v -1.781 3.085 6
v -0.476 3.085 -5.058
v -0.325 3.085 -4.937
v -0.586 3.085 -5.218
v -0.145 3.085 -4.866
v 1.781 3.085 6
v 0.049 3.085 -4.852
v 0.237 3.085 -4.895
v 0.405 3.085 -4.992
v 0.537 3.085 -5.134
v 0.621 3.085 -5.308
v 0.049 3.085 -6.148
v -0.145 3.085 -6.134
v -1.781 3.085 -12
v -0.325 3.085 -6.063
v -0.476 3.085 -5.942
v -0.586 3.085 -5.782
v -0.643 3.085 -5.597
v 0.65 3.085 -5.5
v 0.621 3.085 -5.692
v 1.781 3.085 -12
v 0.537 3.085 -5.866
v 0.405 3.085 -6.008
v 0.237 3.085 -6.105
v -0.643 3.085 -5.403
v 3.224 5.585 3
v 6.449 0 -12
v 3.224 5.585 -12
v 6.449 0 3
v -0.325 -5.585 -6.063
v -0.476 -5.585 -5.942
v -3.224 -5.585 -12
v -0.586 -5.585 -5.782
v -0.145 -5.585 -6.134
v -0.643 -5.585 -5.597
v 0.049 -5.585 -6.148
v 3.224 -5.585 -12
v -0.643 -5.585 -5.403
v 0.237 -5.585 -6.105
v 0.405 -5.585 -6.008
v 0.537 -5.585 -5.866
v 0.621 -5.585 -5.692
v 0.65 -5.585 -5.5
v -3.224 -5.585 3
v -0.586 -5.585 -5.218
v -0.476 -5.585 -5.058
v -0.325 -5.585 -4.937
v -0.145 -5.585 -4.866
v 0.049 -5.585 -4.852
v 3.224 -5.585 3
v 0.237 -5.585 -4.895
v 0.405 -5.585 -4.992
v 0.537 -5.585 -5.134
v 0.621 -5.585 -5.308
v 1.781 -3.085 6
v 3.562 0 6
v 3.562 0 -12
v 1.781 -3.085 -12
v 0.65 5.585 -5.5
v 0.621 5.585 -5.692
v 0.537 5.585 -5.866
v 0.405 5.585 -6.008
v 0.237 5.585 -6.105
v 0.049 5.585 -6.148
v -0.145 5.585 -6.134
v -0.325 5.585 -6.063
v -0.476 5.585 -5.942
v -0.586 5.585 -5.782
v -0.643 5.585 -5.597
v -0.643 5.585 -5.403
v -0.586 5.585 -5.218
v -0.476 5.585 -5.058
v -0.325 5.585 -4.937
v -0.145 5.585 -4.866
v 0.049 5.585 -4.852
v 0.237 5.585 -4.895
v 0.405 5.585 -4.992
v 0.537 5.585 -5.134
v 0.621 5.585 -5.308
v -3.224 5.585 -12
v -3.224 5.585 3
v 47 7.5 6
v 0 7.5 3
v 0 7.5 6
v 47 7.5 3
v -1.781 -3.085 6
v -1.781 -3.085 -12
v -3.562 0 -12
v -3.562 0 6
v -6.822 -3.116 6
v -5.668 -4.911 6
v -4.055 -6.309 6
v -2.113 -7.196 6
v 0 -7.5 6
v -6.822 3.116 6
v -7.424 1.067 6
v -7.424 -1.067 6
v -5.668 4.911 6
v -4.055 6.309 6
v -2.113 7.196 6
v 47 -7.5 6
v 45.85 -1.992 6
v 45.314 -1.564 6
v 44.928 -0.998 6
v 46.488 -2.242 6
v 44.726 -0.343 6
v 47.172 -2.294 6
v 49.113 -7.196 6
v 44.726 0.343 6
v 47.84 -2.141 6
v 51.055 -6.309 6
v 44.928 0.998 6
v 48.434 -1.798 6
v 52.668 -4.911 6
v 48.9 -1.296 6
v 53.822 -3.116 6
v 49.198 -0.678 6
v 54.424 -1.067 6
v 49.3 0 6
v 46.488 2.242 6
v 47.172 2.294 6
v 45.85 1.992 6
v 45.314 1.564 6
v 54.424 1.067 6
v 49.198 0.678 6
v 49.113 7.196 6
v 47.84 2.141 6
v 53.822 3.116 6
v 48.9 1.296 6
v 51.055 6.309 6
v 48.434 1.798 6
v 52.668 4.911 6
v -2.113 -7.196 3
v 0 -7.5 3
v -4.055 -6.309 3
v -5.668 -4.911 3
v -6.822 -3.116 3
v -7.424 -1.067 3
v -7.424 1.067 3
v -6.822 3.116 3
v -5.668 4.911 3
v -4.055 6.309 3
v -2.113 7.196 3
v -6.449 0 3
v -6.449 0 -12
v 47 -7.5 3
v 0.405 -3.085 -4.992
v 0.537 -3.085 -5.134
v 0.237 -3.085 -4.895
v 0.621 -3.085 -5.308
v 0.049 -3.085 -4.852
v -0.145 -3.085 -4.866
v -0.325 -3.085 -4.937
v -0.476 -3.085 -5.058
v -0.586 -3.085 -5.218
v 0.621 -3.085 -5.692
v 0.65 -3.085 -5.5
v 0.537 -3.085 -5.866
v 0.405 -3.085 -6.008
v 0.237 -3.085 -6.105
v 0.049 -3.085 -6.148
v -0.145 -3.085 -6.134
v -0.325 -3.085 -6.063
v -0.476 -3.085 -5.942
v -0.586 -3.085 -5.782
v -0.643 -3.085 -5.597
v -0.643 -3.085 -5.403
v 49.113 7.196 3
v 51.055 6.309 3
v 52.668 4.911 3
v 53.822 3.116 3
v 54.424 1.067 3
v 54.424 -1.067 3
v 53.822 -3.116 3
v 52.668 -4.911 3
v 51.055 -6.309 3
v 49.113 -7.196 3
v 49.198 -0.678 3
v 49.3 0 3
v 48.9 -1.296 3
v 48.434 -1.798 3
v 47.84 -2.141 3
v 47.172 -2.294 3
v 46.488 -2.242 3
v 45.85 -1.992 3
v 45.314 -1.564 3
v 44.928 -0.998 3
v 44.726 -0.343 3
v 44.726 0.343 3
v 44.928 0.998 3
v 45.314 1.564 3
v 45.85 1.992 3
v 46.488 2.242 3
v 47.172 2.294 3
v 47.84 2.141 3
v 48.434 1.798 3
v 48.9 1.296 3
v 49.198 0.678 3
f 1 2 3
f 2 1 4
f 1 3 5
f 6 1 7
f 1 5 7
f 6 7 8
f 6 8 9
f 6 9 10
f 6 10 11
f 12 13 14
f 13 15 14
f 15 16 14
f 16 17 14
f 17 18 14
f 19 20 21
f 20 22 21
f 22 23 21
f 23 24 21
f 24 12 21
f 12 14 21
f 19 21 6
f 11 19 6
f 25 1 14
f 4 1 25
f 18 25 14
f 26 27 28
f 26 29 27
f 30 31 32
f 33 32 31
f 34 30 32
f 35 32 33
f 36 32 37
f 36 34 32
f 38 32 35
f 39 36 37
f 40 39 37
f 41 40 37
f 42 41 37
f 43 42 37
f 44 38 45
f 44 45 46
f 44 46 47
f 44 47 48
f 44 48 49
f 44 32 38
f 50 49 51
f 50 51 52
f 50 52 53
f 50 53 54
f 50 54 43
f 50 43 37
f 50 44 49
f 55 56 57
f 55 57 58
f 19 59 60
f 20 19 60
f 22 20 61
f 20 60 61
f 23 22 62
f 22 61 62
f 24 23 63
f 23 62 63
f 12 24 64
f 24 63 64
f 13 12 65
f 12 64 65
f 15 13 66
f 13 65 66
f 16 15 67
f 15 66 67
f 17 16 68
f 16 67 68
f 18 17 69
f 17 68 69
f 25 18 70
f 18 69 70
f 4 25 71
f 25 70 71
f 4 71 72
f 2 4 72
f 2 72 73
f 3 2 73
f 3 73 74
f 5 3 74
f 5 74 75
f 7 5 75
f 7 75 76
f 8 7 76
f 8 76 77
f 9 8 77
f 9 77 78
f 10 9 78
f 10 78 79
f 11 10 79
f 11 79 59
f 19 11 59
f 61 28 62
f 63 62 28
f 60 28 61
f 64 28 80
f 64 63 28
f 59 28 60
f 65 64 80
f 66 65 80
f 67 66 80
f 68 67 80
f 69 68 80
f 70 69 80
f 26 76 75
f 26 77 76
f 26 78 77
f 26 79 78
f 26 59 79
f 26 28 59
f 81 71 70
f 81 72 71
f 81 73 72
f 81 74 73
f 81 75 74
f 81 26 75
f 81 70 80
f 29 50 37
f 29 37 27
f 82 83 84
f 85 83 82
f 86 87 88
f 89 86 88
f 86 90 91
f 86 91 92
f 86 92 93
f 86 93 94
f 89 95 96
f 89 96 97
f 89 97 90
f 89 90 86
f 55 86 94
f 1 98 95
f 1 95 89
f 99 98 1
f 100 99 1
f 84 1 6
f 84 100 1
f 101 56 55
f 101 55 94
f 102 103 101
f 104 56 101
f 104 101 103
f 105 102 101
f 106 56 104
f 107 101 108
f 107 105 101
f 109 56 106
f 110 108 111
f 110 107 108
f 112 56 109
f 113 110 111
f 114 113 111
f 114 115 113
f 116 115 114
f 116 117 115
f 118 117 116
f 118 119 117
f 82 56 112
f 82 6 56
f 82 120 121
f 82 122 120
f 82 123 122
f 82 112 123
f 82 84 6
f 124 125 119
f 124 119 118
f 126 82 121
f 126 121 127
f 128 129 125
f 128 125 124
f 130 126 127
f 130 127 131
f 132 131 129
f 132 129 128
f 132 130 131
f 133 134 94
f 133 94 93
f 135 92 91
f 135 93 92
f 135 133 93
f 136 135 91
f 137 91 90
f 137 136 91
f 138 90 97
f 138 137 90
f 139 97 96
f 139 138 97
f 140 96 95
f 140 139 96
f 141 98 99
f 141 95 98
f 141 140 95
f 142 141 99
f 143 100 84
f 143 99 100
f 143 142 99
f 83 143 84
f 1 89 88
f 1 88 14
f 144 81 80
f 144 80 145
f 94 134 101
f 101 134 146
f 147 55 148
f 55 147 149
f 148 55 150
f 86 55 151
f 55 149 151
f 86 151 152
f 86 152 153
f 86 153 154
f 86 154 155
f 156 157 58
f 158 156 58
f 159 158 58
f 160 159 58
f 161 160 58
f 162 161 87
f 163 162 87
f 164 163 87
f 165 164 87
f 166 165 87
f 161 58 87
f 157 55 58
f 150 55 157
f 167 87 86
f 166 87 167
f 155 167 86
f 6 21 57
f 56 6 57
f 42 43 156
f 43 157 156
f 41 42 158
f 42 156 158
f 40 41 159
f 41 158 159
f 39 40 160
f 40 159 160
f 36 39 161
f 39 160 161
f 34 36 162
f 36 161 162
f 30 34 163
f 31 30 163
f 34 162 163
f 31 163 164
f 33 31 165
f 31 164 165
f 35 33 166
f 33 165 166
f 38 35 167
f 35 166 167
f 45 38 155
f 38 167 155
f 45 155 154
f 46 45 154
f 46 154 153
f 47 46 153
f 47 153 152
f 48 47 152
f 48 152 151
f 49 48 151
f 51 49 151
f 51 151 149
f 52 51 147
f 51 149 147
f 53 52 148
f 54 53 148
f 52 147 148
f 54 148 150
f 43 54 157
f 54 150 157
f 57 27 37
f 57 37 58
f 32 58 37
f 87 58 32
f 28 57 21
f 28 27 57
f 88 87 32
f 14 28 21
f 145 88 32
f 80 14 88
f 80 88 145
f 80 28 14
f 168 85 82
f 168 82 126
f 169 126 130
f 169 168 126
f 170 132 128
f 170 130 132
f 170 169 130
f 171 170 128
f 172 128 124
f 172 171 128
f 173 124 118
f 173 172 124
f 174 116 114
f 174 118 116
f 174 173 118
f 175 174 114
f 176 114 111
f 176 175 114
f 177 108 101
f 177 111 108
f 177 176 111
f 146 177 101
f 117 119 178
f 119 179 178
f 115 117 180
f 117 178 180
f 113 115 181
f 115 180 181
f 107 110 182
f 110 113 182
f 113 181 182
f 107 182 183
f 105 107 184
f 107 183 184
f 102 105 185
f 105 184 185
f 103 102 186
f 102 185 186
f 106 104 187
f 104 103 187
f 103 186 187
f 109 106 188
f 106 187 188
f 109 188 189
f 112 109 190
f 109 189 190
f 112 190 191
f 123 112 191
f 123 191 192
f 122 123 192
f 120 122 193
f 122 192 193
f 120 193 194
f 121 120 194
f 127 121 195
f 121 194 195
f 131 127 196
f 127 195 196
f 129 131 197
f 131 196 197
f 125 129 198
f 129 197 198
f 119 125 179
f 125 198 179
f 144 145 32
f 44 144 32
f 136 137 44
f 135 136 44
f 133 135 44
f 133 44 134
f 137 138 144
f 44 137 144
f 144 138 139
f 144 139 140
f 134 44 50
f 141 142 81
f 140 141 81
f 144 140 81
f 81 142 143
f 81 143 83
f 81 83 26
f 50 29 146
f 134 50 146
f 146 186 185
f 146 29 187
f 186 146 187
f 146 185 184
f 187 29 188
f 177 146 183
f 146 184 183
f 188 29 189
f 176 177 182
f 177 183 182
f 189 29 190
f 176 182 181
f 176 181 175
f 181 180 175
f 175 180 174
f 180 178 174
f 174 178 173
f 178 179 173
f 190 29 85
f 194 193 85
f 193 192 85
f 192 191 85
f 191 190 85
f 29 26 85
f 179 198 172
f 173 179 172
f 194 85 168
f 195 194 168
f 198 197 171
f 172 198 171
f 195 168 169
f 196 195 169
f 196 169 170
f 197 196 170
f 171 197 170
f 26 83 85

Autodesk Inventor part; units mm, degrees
ref_plane "YZ Plane" through (0, 0, 0) normal (1, 0, 0) x (0, 1, 0)
ref_plane "XZ Plane" through (0, 0, 0) normal (0, 1, 0) x (-1, 0, 0)
ref_plane "Work Plane4" through (0, 0, 3) normal (0, 0, 1) x (1, 0, 0)
sketch "Sketch3" plane through (0, 0, 3) normal (0, 0, 1) x (1, 0, 0)
  circle A0 centre (47, 0) radius 2.3
  circle A1 centre (0, 0) radius 7.5 projected
  circle A2 centre (47, 0) radius 7.5
  line L0 (0, -7.5) -> (47, -7.5)
  line L1 (47, 0) -> (12.3969, 0) construction
  line L2 (0, 7.5) -> (47, 7.5)
  point P0 (0, 0)
  dimension "d13" = 15
  dimension "d5" = 4.6
  dimension "d14" = 47
extrude "Extrusion5" add sketch "Sketch3" along normal blind 3
sketch "Sketch6" plane through (0, 0, 3) normal (0, 0, -1) x (-1, 0, 0)
  arc A0 (0, -7.5) -> (0, 7.5) centre (0, 0) ccw projected
  line L0 (0, 0) -> (3.1, 0) construction
  line L1 (0, 0) -> (1.55, 2.6847) construction
  line L2 (0, 0) -> (-1.55, 2.6847) construction
  line L3 (0, 0) -> (-3.1, 0) construction
  line L4 (0, 0) -> (-1.55, -2.6847) construction
  line L5 (0, 0) -> (1.55, -2.6847) construction
  line L6 (-1.55, 2.6847) -> (1.55, 2.6847) construction
  line L7 (1.55, 2.6847) -> (3.1, 0) construction
  line L8 (3.1, 0) -> (1.55, -2.6847) construction
  line L9 (1.55, -2.6847) -> (-1.55, -2.6847) construction
  line L10 (-1.55, -2.6847) -> (-3.1, 0) construction
  line L11 (-3.1, 0) -> (-1.55, 2.6847) construction
  line L12 (3.5619, 0) -> (1.7809, 3.0847)
  line L13 (1.7809, 3.0847) -> (-1.7809, 3.0847)
  line L14 (-1.7809, 3.0847) -> (-3.5619, 0)
  line L15 (-3.5619, 0) -> (-1.7809, -3.0847)
  line L16 (-1.7809, -3.0847) -> (1.7809, -3.0847)
  line L17 (1.7809, -3.0847) -> (3.5619, 0)
  line L18 (3.2243, 5.5847) -> (6.4486, 0)
  line L19 (6.4486, 0) -> (3.2243, -5.5847)
  line L20 (3.2243, -5.5847) -> (-3.2243, -5.5847)
  line L21 (-3.2243, -5.5847) -> (-6.4486, 0)
  line L22 (-6.4486, 0) -> (-3.2243, 5.5847)
  line L23 (-3.2243, 5.5847) -> (3.2243, 5.5847)
  point P0 (0, 0)
  dimension "d17" = 3.1
  dimension "d20" = 360
  dimension "d22" = 0.4
  dimension "d23" = 2.5
extrude "Extrusion6" add sketch "Sketch6" along normal blind 15
sketch "Sketch7" plane through (0, 0, 3) normal (0, 0, -1) x (-1, 0, 0)
  line L0 (3.5619, 0) -> (1.7809, 3.0847) projected
  line L1 (1.7809, 3.0847) -> (-1.7809, 3.0847) projected
  line L2 (-1.7809, 3.0847) -> (-3.5619, 0) projected
  line L3 (-3.5619, 0) -> (-1.7809, -3.0847) projected
  line L4 (-1.7809, -3.0847) -> (1.7809, -3.0847) projected
  line L5 (1.7809, -3.0847) -> (3.5619, 0) projected
  point P0 (0, 0)
extrude "Extrusion7" cut sketch "Sketch7" against normal blind 15
sketch "Sketch8" plane through (-3.2243, 5.5847, 3) normal (0, 1, 0) x (1, 0, 0)
  line L0 (6.4486, 0) -> (0, 0) projected
  line L1 (6.4486, 0) -> (6.4486, 15) projected
  line L2 (0, 15) -> (6.4486, 15) projected
  line L3 (0, 0) -> (0, 15) projected
  line L4 (0, 0) -> (0, 15) projected
  line L5 (1.4434, 15) -> (5.0053, 15) projected
  line L6 (3.2243, 0) -> (3.2243, -3) projected
  line L7 (3.2243, 15) -> (3.2243, 0) construction
  circle A0 centre (3.2243, 8.5) radius 0.65
  line L8 (-4.2757, -3) -> (3.2243, -3) projected
  point P0 (3.2243, 3)
  dimension "d29" = 1.3
  dimension "d30" = 11.5
extrude "Extrusion8" cut sketch "Sketch8" against normal blind 15 contours A0
properties part number "Acople_TransPot"
